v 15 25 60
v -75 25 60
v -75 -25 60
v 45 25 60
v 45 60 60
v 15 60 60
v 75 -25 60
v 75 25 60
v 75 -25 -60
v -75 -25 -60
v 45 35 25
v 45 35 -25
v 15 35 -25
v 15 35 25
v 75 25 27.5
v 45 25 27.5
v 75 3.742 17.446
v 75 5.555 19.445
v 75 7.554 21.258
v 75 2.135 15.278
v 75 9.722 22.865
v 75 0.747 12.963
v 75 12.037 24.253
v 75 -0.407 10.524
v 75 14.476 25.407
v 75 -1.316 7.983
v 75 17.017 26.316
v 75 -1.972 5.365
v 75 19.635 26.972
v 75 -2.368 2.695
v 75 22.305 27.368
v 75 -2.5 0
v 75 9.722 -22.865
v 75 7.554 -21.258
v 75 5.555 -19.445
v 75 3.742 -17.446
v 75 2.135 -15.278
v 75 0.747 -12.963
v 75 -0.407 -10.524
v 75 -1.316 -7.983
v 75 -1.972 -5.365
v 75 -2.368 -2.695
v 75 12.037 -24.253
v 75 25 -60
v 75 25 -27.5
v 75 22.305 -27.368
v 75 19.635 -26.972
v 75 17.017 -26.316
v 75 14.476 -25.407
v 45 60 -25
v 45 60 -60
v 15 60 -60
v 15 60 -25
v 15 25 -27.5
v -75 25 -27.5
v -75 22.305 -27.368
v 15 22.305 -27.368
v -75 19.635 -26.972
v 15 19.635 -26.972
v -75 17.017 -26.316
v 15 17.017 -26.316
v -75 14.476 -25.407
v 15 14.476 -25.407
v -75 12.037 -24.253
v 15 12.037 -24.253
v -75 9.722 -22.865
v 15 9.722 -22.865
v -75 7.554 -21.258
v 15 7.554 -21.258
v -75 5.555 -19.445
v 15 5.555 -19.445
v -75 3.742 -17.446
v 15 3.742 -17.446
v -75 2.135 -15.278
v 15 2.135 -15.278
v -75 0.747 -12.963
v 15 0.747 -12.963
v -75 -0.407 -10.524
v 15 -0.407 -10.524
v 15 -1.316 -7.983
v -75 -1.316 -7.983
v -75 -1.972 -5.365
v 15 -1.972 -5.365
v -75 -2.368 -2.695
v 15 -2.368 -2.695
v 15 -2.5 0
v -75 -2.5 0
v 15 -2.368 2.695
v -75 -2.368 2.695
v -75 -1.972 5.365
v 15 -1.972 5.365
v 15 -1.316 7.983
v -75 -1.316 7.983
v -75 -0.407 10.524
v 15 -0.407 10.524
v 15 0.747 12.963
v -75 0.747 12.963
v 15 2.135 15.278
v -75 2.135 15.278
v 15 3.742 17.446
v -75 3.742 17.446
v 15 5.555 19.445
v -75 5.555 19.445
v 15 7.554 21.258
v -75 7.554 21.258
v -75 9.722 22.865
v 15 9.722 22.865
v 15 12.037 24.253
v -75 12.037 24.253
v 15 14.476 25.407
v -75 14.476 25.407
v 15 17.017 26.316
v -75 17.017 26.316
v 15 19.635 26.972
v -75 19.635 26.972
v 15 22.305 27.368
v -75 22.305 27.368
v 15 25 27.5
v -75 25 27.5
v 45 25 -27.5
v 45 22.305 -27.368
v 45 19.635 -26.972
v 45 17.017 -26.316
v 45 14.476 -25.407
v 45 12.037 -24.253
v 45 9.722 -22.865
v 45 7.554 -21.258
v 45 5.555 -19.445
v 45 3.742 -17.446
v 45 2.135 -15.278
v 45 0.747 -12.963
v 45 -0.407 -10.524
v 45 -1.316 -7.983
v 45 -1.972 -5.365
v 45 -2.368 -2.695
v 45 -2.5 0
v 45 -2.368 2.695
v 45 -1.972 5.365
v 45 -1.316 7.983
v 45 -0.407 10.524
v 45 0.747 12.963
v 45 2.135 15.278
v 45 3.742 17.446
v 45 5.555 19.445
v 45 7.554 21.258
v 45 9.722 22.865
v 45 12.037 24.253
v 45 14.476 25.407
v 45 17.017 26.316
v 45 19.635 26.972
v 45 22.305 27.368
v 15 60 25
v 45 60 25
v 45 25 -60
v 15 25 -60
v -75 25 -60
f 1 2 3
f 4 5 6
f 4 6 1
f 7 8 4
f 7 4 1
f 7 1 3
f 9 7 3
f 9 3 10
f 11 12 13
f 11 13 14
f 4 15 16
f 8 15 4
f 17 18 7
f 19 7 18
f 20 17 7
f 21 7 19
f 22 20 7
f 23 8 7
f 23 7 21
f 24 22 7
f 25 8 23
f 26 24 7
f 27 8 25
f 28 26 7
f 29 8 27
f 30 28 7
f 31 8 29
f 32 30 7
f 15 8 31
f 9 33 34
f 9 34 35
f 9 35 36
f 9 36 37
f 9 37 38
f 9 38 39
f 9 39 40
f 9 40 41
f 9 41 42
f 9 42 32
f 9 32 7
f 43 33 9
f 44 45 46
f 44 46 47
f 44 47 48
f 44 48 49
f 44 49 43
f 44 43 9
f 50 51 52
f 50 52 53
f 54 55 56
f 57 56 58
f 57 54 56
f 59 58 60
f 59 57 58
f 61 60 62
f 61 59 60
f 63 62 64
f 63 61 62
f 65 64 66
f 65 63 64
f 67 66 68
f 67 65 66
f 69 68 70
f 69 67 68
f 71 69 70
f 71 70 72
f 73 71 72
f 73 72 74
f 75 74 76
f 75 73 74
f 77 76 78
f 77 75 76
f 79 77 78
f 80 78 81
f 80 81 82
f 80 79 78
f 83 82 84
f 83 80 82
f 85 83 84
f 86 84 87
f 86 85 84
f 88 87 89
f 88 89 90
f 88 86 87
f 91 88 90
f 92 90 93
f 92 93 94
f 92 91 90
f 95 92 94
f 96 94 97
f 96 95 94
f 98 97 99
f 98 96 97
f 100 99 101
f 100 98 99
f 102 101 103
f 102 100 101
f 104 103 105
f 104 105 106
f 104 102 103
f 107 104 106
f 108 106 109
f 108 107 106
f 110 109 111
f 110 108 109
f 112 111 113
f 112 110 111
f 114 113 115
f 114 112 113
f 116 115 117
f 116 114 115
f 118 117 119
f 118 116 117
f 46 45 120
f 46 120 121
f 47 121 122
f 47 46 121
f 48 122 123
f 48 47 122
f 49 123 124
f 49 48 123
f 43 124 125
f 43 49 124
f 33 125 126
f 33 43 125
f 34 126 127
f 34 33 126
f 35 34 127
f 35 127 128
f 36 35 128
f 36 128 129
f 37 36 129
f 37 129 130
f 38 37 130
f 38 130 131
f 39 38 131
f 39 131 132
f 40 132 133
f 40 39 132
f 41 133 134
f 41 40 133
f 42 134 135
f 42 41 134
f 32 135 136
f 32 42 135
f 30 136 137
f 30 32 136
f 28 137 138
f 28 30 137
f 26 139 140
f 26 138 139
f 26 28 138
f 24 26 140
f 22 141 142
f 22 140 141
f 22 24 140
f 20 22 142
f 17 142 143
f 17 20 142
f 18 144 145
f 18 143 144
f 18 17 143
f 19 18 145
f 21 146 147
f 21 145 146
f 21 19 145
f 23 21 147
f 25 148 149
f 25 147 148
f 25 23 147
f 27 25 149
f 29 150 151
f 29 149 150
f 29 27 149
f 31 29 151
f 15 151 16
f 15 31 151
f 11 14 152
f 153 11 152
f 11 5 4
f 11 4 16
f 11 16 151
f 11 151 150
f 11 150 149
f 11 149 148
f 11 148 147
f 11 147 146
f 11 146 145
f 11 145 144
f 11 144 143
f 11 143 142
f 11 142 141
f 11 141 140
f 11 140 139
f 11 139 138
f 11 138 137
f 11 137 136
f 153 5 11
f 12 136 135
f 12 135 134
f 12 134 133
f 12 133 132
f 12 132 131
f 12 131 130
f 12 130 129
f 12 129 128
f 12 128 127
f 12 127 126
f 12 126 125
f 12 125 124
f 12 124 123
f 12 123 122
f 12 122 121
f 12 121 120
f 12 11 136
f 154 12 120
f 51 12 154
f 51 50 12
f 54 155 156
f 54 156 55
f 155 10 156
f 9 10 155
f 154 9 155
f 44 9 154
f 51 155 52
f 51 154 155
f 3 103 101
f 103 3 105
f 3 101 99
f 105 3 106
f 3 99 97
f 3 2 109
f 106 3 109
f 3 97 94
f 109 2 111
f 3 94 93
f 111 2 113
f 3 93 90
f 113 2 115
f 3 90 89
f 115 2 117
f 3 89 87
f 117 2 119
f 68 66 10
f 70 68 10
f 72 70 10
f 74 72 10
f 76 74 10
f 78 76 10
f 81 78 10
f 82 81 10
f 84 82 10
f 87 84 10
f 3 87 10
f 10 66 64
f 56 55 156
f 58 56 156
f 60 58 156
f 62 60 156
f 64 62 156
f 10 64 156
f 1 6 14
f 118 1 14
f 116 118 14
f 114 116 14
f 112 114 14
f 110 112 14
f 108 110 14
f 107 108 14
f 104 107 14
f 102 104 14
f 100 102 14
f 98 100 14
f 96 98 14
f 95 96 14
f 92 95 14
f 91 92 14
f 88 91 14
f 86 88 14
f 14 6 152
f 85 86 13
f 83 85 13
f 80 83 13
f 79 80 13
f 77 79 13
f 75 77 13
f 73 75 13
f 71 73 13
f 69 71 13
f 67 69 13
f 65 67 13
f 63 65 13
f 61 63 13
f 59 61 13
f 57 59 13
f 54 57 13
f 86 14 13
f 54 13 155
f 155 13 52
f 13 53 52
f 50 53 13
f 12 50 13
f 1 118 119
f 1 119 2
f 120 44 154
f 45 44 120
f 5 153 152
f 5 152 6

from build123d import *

# Parameters (mm, degrees)
EXTRUDE_1_DEPTH = 75
EXTRUDE_2_DEPTH = 30


with BuildPart() as part:
    # Эскиз1 → Бобышка-Вытянуть1 (new, symmetric)
    with BuildSketch(Plane(origin=(0, 0, 0), x_dir=(0, 0, -1), z_dir=(1, 0, 0))):
        with BuildLine():
            Line((-60, 25), (-60, -25))
            Line((-60, -25), (60, -25))
            Line((60, -25), (60, 25))
            Line((60, 25), (27.5, 25))
            ThreePointArc((27.5, 25), (0, -2.5), (-27.5, 25))
            Line((-27.5, 25), (-60, 25))
        make_face()
    extrude(amount=EXTRUDE_1_DEPTH, both=True)

    # Эскиз2 → Бобышка-Вытянуть2 (add)
    with BuildSketch(Plane(origin=(45, 0, 0), x_dir=(0, 0, -1), z_dir=(1, 0, 0))):
        Polygon((-60, -25), (60, -25), (60, 60), (25, 60), (25, 35), (-25, 35), (-25, 60), (-60, 60), align=None)
    extrude(amount=-EXTRUDE_2_DEPTH)


solid = part.part
